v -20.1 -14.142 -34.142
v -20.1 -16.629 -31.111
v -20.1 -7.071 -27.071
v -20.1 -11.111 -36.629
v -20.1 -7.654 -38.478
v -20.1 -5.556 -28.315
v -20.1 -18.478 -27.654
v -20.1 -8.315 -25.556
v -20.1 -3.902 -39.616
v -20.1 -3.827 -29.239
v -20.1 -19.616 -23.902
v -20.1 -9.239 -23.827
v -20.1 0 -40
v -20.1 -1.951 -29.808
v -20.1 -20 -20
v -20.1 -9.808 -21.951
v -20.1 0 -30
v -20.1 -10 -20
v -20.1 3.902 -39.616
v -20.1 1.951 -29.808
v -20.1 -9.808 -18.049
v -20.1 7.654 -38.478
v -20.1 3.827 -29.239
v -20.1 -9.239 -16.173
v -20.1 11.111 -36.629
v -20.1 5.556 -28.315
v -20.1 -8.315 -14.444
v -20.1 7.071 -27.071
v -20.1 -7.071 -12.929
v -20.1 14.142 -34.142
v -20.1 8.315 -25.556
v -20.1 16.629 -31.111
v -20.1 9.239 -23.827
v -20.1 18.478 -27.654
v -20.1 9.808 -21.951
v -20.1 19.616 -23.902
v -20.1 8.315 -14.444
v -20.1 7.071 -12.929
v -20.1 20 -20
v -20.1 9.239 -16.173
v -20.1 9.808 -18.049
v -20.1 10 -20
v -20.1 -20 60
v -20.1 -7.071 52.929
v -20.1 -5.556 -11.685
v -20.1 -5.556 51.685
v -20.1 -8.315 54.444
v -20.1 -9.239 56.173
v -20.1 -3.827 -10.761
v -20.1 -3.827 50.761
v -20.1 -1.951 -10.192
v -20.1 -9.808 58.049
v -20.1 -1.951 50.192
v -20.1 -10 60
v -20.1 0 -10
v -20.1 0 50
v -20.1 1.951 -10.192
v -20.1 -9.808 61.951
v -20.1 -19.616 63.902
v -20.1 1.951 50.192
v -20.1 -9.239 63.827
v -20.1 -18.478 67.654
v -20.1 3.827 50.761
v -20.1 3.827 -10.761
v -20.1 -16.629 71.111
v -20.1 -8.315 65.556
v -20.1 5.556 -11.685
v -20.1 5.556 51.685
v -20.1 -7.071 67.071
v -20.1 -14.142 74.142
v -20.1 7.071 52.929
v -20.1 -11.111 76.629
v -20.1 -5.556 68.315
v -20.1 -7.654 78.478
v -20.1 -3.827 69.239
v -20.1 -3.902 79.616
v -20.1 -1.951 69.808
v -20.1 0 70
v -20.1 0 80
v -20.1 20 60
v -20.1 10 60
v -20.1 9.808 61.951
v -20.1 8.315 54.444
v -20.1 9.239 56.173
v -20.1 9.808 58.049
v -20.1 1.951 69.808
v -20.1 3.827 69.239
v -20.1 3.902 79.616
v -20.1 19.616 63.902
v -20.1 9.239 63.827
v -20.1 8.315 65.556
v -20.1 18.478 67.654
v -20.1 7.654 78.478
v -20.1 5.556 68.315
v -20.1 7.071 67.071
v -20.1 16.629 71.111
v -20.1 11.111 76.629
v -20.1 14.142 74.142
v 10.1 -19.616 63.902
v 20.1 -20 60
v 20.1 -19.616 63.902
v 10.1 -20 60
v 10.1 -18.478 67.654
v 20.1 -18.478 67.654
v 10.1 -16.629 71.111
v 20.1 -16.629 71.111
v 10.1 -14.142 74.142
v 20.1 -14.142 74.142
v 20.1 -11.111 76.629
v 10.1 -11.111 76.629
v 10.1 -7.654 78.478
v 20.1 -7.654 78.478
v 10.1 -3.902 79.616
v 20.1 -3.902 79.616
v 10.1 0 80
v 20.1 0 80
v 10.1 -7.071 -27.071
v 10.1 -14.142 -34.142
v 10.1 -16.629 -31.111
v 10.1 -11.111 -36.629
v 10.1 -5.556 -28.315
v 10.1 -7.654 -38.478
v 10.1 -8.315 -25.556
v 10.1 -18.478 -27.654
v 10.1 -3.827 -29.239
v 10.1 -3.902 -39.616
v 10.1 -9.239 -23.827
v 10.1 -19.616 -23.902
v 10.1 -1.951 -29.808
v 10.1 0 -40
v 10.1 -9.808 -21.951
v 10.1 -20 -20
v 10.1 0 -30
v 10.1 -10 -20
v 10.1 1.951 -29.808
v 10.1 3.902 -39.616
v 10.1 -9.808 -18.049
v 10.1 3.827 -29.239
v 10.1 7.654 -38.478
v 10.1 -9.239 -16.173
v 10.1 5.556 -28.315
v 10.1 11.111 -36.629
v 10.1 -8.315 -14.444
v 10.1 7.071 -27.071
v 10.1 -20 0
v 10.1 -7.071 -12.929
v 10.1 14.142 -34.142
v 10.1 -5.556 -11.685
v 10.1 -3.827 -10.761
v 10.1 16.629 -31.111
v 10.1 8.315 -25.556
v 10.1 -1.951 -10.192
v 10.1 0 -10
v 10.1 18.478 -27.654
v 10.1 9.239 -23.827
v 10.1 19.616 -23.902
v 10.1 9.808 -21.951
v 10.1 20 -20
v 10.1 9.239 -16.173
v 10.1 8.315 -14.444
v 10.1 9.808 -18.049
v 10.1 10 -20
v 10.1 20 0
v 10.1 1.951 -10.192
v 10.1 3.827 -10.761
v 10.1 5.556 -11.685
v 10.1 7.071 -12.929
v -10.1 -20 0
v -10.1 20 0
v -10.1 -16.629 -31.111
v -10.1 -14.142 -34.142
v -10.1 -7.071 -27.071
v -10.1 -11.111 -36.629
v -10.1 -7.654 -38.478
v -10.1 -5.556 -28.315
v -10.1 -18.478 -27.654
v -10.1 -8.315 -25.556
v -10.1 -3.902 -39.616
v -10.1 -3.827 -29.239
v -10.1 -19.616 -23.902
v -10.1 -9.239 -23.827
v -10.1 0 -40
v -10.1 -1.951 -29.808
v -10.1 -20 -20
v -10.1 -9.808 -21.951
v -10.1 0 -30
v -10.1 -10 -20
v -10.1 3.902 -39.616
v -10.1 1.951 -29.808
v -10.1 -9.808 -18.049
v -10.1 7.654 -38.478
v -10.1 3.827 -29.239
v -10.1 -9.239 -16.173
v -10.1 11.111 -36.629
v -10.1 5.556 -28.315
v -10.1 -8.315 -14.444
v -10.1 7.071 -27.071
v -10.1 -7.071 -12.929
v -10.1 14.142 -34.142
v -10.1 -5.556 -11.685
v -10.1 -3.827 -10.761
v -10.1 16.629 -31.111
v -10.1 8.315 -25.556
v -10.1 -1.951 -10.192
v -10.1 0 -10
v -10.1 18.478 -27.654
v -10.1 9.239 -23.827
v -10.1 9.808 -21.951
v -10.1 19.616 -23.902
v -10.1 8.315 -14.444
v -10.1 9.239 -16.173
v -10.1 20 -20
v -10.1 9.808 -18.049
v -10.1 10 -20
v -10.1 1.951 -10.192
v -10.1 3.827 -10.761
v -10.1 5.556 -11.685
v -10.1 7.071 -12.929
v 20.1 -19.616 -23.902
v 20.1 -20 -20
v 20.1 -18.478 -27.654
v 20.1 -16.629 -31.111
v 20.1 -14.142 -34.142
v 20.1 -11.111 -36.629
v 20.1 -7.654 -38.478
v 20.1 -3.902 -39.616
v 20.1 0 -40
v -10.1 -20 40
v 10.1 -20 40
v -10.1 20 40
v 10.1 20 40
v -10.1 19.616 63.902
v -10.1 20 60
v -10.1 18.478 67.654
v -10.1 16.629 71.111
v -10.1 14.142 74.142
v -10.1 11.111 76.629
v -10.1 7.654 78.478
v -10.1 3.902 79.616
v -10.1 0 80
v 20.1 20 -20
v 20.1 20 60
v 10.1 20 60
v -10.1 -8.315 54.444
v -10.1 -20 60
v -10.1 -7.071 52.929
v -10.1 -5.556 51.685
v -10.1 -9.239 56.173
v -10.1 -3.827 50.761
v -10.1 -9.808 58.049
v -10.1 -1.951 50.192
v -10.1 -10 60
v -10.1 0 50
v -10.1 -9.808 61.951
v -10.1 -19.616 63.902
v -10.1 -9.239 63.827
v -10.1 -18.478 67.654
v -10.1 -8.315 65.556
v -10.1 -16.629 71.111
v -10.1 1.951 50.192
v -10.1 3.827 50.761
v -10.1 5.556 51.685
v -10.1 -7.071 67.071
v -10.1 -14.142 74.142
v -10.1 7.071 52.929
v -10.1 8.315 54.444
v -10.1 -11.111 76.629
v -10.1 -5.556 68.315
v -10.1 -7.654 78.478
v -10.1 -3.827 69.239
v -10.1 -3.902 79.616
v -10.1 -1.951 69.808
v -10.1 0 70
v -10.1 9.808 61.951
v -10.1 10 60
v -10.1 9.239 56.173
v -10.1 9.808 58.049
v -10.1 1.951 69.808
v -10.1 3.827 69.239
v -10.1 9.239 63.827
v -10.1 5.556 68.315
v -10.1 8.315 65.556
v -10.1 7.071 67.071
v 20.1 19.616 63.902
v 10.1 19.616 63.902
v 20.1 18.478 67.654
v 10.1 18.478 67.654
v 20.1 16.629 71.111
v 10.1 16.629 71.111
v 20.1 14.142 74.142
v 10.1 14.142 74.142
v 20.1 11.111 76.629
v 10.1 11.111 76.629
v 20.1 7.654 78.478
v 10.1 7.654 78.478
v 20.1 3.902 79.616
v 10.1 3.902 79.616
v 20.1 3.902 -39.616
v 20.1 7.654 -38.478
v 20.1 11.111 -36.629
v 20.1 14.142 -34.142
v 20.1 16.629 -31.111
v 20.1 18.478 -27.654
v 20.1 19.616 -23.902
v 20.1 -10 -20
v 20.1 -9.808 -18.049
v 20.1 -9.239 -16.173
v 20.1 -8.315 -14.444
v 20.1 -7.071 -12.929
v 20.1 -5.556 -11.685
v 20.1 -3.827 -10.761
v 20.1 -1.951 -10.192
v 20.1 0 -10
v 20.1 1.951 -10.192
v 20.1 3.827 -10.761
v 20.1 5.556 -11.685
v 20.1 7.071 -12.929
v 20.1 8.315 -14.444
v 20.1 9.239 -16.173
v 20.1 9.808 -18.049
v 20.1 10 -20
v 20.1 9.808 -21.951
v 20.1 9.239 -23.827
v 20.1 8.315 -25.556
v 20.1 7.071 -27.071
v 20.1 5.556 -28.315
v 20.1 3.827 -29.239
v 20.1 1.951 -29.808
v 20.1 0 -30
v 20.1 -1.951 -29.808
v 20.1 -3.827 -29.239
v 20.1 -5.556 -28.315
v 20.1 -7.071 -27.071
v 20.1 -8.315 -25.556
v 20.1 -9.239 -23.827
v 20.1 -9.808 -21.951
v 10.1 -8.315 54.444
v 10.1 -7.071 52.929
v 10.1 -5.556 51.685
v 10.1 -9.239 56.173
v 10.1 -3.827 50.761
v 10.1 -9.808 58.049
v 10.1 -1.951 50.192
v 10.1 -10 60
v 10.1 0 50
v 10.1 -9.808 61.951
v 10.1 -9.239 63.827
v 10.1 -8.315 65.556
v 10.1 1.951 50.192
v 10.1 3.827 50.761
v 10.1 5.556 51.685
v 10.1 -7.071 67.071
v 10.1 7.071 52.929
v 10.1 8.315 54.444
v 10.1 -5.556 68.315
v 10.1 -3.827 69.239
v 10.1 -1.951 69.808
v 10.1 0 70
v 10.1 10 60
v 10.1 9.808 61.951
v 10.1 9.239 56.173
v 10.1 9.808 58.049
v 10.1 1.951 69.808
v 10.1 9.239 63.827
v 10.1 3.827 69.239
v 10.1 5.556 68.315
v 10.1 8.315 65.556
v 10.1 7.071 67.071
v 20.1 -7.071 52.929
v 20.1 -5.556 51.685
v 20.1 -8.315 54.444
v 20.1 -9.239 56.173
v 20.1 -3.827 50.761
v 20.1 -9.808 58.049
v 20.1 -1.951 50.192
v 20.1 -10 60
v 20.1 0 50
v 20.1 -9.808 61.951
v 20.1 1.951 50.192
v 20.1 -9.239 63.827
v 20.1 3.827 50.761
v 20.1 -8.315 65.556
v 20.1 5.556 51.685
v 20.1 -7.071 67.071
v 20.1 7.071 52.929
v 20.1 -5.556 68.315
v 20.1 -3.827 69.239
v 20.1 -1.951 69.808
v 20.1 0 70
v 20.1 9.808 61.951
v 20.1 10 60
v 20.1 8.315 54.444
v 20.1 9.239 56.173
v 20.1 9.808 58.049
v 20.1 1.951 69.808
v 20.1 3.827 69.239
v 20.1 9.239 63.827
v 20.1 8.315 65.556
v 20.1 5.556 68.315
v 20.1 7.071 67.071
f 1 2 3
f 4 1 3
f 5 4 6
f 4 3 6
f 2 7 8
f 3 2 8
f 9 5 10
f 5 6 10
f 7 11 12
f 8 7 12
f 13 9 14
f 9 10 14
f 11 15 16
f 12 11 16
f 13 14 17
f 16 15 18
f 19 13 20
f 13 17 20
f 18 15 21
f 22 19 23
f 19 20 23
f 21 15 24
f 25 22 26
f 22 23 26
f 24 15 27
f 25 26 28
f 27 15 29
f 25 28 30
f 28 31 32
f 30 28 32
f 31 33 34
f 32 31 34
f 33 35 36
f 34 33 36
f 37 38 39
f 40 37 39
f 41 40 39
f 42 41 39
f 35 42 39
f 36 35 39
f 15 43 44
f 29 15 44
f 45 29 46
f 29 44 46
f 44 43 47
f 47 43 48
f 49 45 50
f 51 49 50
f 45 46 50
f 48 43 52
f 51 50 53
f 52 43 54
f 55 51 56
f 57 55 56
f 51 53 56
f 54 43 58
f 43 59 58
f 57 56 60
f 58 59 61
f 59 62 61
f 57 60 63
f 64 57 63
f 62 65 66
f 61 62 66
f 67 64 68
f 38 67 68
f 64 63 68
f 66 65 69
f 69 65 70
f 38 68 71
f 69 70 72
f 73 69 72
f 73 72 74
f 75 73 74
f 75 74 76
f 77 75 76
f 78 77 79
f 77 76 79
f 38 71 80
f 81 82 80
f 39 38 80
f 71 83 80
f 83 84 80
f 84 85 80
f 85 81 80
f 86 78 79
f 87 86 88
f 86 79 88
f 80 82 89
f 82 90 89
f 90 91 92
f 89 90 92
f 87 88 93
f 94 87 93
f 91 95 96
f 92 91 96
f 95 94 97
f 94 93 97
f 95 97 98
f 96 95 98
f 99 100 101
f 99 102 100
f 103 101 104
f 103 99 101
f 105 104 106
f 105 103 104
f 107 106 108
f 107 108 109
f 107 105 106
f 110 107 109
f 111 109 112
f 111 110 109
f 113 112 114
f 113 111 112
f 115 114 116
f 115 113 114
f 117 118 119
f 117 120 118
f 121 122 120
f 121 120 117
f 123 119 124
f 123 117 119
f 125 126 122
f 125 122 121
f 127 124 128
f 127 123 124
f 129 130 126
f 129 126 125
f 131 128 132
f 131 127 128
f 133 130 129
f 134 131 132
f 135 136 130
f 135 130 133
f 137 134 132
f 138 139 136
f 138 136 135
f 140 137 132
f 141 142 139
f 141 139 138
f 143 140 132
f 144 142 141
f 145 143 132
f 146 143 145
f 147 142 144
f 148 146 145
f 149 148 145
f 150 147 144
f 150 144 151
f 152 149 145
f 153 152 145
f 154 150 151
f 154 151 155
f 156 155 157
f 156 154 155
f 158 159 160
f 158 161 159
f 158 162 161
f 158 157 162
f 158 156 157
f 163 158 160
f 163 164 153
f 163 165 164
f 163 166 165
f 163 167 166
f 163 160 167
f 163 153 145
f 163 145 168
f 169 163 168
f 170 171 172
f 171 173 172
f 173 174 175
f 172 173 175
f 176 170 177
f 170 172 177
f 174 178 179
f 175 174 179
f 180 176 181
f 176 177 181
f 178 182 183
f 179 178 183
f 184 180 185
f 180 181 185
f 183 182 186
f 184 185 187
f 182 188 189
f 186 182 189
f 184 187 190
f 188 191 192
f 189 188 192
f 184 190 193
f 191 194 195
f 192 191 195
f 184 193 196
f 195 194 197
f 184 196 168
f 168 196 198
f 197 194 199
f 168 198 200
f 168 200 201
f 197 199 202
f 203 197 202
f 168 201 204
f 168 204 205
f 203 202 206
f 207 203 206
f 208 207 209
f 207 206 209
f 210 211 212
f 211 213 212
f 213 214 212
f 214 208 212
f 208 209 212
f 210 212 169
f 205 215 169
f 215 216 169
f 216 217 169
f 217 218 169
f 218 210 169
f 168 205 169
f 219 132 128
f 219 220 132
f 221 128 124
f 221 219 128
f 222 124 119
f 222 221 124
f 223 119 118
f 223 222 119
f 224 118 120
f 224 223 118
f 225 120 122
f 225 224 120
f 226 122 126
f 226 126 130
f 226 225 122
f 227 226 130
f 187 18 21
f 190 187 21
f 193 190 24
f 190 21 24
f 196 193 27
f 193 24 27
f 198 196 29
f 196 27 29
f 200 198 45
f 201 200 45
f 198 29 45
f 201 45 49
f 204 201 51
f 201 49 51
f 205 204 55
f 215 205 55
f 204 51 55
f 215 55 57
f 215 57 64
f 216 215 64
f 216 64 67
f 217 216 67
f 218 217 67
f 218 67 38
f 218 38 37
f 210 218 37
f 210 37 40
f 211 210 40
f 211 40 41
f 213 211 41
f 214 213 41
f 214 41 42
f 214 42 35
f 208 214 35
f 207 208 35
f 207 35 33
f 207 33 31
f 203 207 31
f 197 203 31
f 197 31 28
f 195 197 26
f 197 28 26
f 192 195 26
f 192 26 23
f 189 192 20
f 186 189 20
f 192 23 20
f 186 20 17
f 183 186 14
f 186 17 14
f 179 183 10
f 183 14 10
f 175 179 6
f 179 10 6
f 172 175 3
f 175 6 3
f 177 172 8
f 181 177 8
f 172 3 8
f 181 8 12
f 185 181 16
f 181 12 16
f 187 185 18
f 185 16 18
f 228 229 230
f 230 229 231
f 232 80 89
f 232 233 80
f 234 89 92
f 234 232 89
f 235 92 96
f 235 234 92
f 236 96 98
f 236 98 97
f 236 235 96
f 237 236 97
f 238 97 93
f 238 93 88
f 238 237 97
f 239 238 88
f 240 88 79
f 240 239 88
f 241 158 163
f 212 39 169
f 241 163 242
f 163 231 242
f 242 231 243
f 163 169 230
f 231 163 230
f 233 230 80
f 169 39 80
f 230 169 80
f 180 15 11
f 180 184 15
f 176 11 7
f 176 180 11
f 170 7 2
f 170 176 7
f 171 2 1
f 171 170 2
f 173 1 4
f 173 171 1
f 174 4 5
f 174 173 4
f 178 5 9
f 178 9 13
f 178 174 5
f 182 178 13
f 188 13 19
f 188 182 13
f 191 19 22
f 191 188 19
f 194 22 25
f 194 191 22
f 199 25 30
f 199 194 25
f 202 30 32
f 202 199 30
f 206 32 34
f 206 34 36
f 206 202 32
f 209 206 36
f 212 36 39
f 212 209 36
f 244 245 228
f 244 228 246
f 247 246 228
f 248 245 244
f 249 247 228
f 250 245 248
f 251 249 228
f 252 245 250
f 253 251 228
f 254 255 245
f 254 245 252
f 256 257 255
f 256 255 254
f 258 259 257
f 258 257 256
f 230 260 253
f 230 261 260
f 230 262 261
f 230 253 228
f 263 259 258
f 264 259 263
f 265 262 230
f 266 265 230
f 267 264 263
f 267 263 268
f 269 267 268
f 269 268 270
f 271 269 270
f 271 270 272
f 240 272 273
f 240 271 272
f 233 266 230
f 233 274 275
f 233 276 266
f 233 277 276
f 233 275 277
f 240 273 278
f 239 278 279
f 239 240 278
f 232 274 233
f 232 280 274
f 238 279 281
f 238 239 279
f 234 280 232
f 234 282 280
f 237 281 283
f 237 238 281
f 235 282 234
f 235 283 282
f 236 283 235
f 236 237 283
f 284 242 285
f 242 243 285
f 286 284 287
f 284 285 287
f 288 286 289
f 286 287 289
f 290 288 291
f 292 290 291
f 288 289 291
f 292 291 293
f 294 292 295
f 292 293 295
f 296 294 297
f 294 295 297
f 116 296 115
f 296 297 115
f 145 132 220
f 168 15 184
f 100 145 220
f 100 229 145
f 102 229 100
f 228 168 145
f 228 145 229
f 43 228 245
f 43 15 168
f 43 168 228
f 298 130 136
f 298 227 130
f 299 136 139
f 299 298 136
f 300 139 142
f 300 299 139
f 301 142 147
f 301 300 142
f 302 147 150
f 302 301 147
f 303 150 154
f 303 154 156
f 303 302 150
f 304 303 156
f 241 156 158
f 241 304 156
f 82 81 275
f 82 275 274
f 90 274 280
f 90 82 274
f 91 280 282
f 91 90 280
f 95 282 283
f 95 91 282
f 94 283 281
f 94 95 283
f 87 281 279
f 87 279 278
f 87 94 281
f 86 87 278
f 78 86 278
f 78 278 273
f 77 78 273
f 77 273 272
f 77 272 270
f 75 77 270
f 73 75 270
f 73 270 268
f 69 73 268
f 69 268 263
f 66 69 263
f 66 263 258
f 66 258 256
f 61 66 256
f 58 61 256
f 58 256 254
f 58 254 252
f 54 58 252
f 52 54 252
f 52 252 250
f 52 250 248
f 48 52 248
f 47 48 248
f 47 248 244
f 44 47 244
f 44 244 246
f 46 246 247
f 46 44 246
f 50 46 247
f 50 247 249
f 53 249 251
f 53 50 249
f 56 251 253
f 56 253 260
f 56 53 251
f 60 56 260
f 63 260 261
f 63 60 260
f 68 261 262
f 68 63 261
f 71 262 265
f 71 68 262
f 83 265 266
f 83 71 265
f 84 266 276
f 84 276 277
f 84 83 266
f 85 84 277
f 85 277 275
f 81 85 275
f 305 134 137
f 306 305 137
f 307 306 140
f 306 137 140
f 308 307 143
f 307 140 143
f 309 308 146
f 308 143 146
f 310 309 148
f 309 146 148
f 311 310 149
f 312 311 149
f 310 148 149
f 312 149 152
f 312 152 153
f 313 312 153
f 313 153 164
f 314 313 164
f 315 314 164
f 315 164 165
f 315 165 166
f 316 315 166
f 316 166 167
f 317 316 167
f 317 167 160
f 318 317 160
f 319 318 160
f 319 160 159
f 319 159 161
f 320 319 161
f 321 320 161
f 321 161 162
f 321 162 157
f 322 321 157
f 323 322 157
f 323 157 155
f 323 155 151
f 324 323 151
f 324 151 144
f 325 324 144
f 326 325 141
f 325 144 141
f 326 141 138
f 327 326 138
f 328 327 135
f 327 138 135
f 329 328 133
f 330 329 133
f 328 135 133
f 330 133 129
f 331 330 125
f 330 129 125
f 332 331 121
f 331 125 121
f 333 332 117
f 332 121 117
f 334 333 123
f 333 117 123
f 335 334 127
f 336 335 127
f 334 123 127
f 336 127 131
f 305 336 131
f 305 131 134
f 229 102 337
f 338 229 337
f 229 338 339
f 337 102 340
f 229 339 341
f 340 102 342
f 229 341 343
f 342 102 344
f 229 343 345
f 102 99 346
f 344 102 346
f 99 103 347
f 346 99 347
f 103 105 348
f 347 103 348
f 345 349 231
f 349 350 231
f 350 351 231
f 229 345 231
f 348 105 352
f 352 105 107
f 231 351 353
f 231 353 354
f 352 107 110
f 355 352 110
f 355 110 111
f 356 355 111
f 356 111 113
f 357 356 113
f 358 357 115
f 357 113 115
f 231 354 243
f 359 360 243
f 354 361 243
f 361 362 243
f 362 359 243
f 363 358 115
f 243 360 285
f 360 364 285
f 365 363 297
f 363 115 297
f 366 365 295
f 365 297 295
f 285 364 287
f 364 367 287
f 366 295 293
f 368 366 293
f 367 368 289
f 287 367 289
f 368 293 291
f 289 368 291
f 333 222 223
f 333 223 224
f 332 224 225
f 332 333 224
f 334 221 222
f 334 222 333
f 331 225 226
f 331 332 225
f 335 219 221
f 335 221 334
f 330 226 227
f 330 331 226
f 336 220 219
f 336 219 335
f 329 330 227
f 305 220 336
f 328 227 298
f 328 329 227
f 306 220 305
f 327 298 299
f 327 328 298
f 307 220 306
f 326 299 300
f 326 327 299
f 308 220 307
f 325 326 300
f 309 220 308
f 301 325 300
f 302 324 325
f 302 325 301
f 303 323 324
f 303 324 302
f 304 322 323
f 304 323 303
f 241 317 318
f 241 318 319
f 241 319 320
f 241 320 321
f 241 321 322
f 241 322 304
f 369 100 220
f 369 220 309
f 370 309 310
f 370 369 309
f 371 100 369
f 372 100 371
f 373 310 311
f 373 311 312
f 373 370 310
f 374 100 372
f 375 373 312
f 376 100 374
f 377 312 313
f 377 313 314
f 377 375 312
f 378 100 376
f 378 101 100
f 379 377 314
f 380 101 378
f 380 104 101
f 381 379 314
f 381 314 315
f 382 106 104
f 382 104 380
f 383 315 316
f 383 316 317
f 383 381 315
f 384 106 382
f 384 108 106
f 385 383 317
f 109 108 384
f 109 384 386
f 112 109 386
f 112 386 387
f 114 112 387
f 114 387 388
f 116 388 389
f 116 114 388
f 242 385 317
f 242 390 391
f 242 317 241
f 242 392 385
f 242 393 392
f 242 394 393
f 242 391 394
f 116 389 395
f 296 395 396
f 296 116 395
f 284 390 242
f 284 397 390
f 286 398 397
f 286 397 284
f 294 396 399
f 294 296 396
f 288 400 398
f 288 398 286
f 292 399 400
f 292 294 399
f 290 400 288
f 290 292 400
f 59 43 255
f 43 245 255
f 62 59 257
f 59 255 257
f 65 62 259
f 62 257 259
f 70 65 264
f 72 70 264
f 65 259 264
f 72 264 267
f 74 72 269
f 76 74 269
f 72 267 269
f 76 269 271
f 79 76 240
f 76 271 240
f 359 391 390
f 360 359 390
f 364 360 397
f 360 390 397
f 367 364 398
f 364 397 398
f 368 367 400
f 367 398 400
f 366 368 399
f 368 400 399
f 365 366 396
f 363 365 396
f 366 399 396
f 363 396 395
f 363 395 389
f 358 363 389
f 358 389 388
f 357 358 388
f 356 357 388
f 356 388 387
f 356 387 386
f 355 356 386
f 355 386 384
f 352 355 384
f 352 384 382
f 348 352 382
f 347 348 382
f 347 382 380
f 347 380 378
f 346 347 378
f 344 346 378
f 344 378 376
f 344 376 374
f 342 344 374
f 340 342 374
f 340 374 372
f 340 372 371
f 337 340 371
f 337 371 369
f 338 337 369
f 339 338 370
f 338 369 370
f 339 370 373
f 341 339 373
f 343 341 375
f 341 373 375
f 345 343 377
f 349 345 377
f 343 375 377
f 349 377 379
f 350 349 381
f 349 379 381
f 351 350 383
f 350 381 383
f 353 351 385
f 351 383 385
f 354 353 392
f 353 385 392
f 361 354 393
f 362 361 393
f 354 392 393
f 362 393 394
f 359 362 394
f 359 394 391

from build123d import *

# Parameters (mm, degrees)
F0_W      = 40
F0_H      = 80
F1_DEPTH  = 20.1
F2_W      = 40
F2_H      = 40
F3_DEPTH  = 10
F4_R      = 10
F5_DEPTH  = 10.1
F7_R      = 19.99999
F8_R      = 10
F9_DEPTH  = 80
F10_W     = 20.2
F10_H     = 40
F11_DEPTH = 40
F12_R     = 19.99999


# Not quite as in the source:
# - a fillet or chamfer is up to 0.001 mm smaller than in the source, because OpenCascade refuses the exact size


with BuildPart() as f1:
    # F0 (on Right) → F1 (new body)
    with BuildSketch(Plane.YZ):
        Rectangle(F0_W, F0_H)
    extrude(amount=F1_DEPTH)

    # F2 (on face) → F3 (join)
    with BuildSketch(Plane.YZ.offset(20.1)):
        with Locations((0, 60)):
            Rectangle(F2_W, F2_H)
    extrude(amount=-F3_DEPTH)

    # F4 (on face) → F5 (cut)
    with BuildSketch(Plane.YZ.offset(20.1)):
        with Locations((0, 60)):
            Circle(F4_R)
    extrude(amount=-F5_DEPTH, mode=Mode.SUBTRACT)

    # F6: F1 across face


with BuildPart() as f1_1:
    add(f1.part)
    add(f1.part.mirror(Plane(origin=(0, 0, 0), x_dir=(0, 1, 0), z_dir=(-1, 0, 0))))

    # F7 (radius 20 in the source; OpenCascade refuses exactly that, so slightly less here)
    f7_edges = [f1_1.edges().sort_by_distance(p)[0] for p in [
        (15.1, 20, 80),
        (15.1, -20, 80),
        (-15.1, 20, 80),
        (-15.1, -20, 80),
    ]]
    fillet(f7_edges, radius=F7_R)

    # F8 (on face) → F9 (cut)
    with BuildSketch(Plane(origin=(-20.1, 0, 0), x_dir=(0, -1, 0), z_dir=(-1, 0, 0))):
        with Locations((0, -20)):
            Circle(F8_R)
    extrude(amount=-F9_DEPTH, mode=Mode.SUBTRACT)

    # F10 (on face) → F11 (cut, through all)
    with BuildSketch(Plane(origin=(0, 20, 0), x_dir=(-1, 0, 0), z_dir=(0, 1, 0))):
        with Locations((0, -20)):
            Rectangle(F10_W, F10_H)
    extrude(amount=-F11_DEPTH, mode=Mode.SUBTRACT)

    # F12 (radius 20 in the source; OpenCascade refuses exactly that, so slightly less here)
    f12_edges = [f1_1.edges().sort_by_distance(p)[0] for p in [
        (-15.1, 20, -40),
        (-15.1, -20, -40),
        (15.1, 20, -40),
        (15.1, -20, -40),
    ]]
    fillet(f12_edges, radius=F12_R)


solid = f1_1.part
